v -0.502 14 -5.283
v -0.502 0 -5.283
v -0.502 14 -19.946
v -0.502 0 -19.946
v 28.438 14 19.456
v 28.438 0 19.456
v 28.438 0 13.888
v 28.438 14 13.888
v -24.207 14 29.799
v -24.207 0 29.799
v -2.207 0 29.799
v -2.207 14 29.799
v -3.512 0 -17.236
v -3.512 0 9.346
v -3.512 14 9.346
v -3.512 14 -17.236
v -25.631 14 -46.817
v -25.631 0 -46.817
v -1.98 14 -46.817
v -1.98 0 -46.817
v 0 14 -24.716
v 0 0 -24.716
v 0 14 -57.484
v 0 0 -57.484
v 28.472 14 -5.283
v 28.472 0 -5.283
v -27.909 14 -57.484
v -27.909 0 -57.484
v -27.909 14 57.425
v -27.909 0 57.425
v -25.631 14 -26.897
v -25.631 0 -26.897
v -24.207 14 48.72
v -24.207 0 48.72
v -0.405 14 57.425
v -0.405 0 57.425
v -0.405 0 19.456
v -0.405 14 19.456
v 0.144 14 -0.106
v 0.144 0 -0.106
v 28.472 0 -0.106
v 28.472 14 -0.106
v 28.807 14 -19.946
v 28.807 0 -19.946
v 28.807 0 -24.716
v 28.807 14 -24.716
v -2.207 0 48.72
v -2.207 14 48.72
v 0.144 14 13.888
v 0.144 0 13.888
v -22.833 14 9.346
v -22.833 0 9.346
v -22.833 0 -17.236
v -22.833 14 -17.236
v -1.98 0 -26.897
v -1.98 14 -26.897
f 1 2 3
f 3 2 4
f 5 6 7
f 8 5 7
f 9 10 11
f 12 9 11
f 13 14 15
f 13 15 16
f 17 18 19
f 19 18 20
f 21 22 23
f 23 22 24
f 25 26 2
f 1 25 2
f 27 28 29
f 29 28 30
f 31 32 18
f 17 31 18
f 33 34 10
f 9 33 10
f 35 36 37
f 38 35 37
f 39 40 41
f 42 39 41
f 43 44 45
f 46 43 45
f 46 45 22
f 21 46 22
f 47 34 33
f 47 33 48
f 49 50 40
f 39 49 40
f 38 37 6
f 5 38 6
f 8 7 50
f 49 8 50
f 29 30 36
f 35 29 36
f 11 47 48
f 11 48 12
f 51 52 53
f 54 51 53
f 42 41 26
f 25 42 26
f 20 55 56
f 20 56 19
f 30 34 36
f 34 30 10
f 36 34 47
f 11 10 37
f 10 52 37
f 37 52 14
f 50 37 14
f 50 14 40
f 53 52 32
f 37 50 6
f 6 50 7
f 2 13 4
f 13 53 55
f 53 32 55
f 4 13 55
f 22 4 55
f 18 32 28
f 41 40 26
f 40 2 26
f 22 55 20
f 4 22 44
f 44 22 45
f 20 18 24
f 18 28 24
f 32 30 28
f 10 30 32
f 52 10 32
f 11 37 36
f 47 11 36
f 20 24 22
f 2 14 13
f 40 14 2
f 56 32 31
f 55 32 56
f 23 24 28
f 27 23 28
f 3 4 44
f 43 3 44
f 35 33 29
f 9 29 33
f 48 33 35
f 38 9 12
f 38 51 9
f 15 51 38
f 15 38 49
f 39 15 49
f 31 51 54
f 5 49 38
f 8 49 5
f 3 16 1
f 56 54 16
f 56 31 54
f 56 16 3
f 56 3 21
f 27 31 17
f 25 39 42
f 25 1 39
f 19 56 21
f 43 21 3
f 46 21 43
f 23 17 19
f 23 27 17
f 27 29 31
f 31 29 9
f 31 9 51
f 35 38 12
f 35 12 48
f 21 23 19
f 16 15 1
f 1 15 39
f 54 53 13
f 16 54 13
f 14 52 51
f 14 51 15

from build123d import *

# Parameters (mm, degrees)
SKETCH2_W           = 23.651183611
SKETCH2_H           = 19.920292675
SKETCH2_W_2         = 19.320685203
SKETCH2_H_2         = 26.582597918
SKETCH2_W_3         = 22
SKETCH2_H_3         = 18.920946888
BOSS_EXTRUDE1_DEPTH = 14


with BuildPart() as part:
    # Sketch2 → Boss-Extrude1 (new body)
    with BuildSketch(Plane(origin=(0, 0, 0), x_dir=(1, 0, 0), z_dir=(0, 1, 0))):
        Polygon((-27.908593219, 57.483539187), (-27.908593219, -57.424852572), (-0.405302454, -57.424852572), (-0.405302454, -19.455651499), (28.437596205, -19.455651499), (28.437596205, -13.887867334), (0.143608651, -13.887867334), (0.143608651, 0.105967325), (28.472121021, 0.105967325), (28.472121021, 5.282539019), (-0.501944112, 5.282539019), (-0.501944112, 19.945920068), (28.807431377, 19.945920068), (28.807431377, 24.716415232), (0, 24.716415232), (0, 57.483539187), align=None)
        with Locations((-13.80552661, 36.856875137)):
            Rectangle(SKETCH2_W, SKETCH2_H, mode=Mode.SUBTRACT)
        with Locations((-13.172607612, 3.945087239)):
            Rectangle(SKETCH2_W_2, SKETCH2_H_2, mode=Mode.SUBTRACT)
        with Locations((-13.207270194, -39.259962259)):
            Rectangle(SKETCH2_W_3, SKETCH2_H_3, mode=Mode.SUBTRACT)
    extrude(amount=BOSS_EXTRUDE1_DEPTH)


solid = part.part
